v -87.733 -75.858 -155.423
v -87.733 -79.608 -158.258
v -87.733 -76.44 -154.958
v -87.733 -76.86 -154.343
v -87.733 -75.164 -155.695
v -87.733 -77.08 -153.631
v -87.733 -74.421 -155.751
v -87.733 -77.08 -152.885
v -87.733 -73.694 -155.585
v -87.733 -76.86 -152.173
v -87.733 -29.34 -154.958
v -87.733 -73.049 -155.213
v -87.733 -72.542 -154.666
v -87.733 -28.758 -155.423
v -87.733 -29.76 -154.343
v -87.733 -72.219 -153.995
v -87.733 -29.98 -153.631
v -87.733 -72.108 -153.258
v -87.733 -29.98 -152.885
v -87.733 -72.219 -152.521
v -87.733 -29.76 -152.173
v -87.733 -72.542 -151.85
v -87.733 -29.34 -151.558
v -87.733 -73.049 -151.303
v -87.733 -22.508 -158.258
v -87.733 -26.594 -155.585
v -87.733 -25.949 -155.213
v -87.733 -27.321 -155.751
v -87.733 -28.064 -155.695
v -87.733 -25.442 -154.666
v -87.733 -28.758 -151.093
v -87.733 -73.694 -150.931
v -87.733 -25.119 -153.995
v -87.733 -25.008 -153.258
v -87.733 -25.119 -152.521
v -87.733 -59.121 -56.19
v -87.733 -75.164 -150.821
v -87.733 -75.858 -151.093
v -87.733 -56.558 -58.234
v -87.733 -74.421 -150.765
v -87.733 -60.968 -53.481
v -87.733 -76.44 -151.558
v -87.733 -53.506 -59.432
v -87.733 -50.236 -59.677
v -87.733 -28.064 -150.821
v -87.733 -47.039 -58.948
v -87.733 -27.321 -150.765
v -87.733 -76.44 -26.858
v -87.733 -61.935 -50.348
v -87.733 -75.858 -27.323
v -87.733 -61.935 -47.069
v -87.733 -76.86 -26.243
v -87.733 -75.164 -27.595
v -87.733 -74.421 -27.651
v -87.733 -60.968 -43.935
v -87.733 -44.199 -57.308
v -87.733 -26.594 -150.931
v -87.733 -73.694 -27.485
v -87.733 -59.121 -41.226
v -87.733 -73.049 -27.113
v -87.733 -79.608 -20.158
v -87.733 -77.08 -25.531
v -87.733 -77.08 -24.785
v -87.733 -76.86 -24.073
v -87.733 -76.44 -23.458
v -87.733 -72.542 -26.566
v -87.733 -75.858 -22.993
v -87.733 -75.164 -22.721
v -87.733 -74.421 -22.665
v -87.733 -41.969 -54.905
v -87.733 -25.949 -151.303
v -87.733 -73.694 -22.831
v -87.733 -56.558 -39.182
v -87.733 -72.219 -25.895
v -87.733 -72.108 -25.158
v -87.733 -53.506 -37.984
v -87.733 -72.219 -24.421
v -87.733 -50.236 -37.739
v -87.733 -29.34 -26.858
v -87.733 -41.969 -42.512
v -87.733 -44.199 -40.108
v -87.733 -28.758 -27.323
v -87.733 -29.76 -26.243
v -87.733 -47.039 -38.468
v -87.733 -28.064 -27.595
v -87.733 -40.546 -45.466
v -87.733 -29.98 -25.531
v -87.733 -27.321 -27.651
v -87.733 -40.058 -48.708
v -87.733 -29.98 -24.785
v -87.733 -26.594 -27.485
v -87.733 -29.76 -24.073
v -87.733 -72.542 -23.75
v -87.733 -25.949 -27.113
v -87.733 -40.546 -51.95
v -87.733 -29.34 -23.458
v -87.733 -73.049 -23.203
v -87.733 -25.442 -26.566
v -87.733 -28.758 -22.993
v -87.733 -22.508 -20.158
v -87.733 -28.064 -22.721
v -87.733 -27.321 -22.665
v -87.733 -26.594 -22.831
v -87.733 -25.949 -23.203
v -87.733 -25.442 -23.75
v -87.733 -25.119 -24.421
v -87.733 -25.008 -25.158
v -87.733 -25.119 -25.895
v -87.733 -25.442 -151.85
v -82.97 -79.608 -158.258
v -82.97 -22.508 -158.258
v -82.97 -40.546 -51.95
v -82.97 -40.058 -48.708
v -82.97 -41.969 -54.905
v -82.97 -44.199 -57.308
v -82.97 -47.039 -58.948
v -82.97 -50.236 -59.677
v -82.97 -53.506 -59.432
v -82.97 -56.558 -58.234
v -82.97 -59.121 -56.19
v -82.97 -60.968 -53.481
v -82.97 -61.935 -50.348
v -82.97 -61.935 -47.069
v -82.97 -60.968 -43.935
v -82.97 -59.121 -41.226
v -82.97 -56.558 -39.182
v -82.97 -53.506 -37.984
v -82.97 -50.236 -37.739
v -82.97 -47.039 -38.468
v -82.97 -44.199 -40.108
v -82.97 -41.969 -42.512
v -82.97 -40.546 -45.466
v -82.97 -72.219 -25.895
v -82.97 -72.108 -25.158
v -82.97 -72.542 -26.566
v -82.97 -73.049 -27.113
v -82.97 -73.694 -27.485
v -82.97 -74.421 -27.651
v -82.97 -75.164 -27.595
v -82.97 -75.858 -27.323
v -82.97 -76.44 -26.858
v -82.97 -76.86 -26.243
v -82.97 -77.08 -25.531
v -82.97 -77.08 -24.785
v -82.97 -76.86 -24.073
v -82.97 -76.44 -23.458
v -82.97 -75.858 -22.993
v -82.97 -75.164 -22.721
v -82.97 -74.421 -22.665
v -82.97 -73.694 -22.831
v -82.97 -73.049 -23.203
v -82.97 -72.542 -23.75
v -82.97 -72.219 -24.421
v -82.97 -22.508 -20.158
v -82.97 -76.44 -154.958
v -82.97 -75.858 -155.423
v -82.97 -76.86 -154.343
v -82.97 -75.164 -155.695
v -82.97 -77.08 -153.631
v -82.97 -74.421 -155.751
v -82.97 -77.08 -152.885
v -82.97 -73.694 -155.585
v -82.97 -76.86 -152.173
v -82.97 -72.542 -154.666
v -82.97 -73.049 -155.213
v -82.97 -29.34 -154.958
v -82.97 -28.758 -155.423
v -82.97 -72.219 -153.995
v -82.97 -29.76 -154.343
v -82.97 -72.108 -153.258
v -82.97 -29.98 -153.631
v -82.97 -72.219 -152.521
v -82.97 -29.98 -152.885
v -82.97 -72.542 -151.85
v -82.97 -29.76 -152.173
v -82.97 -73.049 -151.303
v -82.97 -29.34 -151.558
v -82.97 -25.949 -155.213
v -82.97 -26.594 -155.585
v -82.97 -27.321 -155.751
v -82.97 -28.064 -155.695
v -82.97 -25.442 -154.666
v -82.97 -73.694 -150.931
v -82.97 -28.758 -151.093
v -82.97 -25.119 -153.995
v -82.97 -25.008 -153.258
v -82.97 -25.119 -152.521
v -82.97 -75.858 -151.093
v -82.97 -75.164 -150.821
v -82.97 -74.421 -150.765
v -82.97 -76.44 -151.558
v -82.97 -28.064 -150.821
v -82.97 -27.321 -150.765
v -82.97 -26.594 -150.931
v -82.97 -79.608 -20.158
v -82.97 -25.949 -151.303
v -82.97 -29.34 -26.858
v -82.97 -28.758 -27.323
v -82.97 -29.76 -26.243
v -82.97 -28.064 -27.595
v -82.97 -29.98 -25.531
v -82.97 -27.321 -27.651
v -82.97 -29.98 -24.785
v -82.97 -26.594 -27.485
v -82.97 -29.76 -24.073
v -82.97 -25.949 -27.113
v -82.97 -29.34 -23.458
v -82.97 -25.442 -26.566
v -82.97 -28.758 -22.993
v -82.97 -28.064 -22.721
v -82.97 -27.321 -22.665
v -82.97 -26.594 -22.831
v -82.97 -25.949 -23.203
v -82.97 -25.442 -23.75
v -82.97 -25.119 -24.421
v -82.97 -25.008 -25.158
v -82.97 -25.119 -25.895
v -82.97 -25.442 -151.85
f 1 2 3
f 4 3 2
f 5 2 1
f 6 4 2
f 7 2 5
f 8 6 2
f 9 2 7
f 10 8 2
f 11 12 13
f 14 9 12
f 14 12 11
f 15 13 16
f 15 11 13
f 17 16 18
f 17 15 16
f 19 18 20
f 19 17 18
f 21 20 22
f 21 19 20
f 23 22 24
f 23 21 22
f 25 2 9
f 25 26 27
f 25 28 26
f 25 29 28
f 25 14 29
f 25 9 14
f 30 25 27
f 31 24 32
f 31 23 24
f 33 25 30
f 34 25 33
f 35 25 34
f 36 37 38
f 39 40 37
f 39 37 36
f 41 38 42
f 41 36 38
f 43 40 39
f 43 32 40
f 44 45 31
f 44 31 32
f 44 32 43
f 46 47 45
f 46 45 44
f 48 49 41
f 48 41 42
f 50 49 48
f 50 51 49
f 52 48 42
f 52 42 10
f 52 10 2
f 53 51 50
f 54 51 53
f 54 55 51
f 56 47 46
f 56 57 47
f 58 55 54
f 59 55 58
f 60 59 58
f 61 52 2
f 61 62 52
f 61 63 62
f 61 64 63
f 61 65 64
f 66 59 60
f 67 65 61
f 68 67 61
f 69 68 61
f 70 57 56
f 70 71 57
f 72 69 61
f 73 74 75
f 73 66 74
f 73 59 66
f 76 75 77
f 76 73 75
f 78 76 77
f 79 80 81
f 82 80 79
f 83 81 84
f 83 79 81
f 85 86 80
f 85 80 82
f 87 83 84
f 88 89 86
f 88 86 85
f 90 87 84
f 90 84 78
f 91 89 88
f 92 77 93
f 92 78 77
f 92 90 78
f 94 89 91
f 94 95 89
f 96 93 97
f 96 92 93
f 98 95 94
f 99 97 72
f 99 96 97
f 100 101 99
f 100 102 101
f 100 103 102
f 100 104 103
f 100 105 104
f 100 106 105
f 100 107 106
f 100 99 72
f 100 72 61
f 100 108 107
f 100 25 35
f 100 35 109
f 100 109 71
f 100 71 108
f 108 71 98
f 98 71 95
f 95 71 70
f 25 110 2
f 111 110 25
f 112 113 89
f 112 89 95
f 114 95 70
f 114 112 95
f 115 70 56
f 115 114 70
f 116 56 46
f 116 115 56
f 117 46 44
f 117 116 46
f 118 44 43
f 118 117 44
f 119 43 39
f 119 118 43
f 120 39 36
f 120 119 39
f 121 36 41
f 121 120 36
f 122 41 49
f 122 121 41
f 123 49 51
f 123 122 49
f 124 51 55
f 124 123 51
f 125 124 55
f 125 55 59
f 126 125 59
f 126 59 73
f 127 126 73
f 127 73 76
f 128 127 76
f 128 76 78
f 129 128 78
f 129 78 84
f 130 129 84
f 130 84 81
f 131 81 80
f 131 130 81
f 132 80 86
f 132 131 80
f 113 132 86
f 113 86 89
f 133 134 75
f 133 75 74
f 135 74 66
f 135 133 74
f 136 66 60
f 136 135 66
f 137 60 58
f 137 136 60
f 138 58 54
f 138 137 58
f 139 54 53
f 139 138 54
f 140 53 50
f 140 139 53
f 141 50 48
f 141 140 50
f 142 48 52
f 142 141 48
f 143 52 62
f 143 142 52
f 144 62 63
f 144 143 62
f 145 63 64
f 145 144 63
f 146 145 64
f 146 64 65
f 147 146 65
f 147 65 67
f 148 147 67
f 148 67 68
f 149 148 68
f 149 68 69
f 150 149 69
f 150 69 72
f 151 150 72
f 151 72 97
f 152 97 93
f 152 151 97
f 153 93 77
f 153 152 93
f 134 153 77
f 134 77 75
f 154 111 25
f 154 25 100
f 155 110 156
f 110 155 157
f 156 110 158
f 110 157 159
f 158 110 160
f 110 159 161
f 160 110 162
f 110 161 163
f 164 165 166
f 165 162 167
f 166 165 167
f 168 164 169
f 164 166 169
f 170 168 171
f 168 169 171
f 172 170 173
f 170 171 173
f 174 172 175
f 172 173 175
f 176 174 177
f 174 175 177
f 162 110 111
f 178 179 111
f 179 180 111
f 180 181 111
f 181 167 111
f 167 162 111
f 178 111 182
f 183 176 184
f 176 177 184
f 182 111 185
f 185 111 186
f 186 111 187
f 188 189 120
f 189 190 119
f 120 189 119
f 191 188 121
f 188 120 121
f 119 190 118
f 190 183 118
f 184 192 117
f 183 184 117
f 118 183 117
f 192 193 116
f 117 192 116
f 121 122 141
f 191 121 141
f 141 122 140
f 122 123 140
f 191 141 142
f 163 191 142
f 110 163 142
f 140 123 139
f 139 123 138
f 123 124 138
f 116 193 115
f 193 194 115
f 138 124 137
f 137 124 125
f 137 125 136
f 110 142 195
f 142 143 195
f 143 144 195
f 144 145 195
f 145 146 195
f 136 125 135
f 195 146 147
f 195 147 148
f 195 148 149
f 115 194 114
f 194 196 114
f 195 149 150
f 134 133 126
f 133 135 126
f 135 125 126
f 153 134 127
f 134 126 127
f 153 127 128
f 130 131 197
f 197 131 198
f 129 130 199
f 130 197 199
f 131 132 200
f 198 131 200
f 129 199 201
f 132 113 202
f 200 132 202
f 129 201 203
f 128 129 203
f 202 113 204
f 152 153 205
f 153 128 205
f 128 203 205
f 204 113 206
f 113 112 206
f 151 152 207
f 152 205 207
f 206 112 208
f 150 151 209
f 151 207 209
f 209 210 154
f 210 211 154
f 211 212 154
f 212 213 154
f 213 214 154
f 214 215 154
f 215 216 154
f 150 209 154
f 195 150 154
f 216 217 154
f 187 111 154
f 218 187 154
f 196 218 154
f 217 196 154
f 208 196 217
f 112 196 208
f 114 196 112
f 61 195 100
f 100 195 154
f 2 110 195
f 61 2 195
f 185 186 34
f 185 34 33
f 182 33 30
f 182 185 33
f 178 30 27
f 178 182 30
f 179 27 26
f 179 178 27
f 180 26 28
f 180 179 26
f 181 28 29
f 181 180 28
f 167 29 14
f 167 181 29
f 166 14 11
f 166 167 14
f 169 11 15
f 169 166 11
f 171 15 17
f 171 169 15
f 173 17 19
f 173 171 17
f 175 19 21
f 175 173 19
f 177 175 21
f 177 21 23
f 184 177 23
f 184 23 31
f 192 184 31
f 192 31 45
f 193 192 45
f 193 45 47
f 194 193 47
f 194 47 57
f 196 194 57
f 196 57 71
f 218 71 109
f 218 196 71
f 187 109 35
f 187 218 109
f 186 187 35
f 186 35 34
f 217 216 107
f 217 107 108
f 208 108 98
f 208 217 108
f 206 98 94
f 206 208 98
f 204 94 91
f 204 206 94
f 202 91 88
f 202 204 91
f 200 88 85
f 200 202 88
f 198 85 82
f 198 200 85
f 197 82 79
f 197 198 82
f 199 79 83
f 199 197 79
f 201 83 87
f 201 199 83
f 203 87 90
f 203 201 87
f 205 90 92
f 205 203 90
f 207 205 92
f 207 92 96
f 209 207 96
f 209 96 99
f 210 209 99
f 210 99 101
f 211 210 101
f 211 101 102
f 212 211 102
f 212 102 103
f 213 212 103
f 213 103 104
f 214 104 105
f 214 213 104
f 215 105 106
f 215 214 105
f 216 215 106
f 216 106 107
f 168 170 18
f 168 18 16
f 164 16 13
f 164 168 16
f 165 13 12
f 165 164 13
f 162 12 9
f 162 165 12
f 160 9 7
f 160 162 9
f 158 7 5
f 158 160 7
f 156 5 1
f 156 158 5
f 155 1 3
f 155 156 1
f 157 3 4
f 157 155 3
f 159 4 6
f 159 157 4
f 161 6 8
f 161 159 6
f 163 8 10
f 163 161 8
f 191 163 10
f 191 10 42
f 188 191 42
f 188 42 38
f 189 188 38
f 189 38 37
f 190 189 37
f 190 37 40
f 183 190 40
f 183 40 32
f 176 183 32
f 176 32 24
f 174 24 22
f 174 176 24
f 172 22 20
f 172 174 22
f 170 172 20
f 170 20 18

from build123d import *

# Parameters (mm, degrees)
SKETCH1_W           = 138.1
SKETCH1_H           = 57.1
SKETCH1_R           = 2.5
SKETCH1_R_2         = 11
BOSS_EXTRUDE1_DEPTH = 4.7625


with BuildPart() as part:
    # Sketch1 → Boss-Extrude1 (new body)
    with BuildSketch(Plane.ZY.offset(82.970238089)):
        with Locations((-89.208048627, -51.057798632)):
            Rectangle(SKETCH1_W, SKETCH1_H)
        with Locations(Location((-153.258048627, -27.507798632, 0), (0, 0, 90))):
            Circle(SKETCH1_R, mode=Mode.SUBTRACT)
        with Locations(Location((-153.258048627, -74.607798632, 0), (0, 0, 90))):
            Circle(SKETCH1_R, mode=Mode.SUBTRACT)
        with Locations(Location((-25.158048627, -27.507798632, 0), (0, 0, 90))):
            Circle(SKETCH1_R, mode=Mode.SUBTRACT)
        with Locations(Location((-25.158048627, -74.607798632, 0), (0, 0, 90))):
            Circle(SKETCH1_R, mode=Mode.SUBTRACT)
        with Locations(Location((-48.708048627, -51.057798632, 0), (0, 0, 90))):
            Circle(SKETCH1_R_2, mode=Mode.SUBTRACT)
    extrude(amount=BOSS_EXTRUDE1_DEPTH)


solid = part.part
